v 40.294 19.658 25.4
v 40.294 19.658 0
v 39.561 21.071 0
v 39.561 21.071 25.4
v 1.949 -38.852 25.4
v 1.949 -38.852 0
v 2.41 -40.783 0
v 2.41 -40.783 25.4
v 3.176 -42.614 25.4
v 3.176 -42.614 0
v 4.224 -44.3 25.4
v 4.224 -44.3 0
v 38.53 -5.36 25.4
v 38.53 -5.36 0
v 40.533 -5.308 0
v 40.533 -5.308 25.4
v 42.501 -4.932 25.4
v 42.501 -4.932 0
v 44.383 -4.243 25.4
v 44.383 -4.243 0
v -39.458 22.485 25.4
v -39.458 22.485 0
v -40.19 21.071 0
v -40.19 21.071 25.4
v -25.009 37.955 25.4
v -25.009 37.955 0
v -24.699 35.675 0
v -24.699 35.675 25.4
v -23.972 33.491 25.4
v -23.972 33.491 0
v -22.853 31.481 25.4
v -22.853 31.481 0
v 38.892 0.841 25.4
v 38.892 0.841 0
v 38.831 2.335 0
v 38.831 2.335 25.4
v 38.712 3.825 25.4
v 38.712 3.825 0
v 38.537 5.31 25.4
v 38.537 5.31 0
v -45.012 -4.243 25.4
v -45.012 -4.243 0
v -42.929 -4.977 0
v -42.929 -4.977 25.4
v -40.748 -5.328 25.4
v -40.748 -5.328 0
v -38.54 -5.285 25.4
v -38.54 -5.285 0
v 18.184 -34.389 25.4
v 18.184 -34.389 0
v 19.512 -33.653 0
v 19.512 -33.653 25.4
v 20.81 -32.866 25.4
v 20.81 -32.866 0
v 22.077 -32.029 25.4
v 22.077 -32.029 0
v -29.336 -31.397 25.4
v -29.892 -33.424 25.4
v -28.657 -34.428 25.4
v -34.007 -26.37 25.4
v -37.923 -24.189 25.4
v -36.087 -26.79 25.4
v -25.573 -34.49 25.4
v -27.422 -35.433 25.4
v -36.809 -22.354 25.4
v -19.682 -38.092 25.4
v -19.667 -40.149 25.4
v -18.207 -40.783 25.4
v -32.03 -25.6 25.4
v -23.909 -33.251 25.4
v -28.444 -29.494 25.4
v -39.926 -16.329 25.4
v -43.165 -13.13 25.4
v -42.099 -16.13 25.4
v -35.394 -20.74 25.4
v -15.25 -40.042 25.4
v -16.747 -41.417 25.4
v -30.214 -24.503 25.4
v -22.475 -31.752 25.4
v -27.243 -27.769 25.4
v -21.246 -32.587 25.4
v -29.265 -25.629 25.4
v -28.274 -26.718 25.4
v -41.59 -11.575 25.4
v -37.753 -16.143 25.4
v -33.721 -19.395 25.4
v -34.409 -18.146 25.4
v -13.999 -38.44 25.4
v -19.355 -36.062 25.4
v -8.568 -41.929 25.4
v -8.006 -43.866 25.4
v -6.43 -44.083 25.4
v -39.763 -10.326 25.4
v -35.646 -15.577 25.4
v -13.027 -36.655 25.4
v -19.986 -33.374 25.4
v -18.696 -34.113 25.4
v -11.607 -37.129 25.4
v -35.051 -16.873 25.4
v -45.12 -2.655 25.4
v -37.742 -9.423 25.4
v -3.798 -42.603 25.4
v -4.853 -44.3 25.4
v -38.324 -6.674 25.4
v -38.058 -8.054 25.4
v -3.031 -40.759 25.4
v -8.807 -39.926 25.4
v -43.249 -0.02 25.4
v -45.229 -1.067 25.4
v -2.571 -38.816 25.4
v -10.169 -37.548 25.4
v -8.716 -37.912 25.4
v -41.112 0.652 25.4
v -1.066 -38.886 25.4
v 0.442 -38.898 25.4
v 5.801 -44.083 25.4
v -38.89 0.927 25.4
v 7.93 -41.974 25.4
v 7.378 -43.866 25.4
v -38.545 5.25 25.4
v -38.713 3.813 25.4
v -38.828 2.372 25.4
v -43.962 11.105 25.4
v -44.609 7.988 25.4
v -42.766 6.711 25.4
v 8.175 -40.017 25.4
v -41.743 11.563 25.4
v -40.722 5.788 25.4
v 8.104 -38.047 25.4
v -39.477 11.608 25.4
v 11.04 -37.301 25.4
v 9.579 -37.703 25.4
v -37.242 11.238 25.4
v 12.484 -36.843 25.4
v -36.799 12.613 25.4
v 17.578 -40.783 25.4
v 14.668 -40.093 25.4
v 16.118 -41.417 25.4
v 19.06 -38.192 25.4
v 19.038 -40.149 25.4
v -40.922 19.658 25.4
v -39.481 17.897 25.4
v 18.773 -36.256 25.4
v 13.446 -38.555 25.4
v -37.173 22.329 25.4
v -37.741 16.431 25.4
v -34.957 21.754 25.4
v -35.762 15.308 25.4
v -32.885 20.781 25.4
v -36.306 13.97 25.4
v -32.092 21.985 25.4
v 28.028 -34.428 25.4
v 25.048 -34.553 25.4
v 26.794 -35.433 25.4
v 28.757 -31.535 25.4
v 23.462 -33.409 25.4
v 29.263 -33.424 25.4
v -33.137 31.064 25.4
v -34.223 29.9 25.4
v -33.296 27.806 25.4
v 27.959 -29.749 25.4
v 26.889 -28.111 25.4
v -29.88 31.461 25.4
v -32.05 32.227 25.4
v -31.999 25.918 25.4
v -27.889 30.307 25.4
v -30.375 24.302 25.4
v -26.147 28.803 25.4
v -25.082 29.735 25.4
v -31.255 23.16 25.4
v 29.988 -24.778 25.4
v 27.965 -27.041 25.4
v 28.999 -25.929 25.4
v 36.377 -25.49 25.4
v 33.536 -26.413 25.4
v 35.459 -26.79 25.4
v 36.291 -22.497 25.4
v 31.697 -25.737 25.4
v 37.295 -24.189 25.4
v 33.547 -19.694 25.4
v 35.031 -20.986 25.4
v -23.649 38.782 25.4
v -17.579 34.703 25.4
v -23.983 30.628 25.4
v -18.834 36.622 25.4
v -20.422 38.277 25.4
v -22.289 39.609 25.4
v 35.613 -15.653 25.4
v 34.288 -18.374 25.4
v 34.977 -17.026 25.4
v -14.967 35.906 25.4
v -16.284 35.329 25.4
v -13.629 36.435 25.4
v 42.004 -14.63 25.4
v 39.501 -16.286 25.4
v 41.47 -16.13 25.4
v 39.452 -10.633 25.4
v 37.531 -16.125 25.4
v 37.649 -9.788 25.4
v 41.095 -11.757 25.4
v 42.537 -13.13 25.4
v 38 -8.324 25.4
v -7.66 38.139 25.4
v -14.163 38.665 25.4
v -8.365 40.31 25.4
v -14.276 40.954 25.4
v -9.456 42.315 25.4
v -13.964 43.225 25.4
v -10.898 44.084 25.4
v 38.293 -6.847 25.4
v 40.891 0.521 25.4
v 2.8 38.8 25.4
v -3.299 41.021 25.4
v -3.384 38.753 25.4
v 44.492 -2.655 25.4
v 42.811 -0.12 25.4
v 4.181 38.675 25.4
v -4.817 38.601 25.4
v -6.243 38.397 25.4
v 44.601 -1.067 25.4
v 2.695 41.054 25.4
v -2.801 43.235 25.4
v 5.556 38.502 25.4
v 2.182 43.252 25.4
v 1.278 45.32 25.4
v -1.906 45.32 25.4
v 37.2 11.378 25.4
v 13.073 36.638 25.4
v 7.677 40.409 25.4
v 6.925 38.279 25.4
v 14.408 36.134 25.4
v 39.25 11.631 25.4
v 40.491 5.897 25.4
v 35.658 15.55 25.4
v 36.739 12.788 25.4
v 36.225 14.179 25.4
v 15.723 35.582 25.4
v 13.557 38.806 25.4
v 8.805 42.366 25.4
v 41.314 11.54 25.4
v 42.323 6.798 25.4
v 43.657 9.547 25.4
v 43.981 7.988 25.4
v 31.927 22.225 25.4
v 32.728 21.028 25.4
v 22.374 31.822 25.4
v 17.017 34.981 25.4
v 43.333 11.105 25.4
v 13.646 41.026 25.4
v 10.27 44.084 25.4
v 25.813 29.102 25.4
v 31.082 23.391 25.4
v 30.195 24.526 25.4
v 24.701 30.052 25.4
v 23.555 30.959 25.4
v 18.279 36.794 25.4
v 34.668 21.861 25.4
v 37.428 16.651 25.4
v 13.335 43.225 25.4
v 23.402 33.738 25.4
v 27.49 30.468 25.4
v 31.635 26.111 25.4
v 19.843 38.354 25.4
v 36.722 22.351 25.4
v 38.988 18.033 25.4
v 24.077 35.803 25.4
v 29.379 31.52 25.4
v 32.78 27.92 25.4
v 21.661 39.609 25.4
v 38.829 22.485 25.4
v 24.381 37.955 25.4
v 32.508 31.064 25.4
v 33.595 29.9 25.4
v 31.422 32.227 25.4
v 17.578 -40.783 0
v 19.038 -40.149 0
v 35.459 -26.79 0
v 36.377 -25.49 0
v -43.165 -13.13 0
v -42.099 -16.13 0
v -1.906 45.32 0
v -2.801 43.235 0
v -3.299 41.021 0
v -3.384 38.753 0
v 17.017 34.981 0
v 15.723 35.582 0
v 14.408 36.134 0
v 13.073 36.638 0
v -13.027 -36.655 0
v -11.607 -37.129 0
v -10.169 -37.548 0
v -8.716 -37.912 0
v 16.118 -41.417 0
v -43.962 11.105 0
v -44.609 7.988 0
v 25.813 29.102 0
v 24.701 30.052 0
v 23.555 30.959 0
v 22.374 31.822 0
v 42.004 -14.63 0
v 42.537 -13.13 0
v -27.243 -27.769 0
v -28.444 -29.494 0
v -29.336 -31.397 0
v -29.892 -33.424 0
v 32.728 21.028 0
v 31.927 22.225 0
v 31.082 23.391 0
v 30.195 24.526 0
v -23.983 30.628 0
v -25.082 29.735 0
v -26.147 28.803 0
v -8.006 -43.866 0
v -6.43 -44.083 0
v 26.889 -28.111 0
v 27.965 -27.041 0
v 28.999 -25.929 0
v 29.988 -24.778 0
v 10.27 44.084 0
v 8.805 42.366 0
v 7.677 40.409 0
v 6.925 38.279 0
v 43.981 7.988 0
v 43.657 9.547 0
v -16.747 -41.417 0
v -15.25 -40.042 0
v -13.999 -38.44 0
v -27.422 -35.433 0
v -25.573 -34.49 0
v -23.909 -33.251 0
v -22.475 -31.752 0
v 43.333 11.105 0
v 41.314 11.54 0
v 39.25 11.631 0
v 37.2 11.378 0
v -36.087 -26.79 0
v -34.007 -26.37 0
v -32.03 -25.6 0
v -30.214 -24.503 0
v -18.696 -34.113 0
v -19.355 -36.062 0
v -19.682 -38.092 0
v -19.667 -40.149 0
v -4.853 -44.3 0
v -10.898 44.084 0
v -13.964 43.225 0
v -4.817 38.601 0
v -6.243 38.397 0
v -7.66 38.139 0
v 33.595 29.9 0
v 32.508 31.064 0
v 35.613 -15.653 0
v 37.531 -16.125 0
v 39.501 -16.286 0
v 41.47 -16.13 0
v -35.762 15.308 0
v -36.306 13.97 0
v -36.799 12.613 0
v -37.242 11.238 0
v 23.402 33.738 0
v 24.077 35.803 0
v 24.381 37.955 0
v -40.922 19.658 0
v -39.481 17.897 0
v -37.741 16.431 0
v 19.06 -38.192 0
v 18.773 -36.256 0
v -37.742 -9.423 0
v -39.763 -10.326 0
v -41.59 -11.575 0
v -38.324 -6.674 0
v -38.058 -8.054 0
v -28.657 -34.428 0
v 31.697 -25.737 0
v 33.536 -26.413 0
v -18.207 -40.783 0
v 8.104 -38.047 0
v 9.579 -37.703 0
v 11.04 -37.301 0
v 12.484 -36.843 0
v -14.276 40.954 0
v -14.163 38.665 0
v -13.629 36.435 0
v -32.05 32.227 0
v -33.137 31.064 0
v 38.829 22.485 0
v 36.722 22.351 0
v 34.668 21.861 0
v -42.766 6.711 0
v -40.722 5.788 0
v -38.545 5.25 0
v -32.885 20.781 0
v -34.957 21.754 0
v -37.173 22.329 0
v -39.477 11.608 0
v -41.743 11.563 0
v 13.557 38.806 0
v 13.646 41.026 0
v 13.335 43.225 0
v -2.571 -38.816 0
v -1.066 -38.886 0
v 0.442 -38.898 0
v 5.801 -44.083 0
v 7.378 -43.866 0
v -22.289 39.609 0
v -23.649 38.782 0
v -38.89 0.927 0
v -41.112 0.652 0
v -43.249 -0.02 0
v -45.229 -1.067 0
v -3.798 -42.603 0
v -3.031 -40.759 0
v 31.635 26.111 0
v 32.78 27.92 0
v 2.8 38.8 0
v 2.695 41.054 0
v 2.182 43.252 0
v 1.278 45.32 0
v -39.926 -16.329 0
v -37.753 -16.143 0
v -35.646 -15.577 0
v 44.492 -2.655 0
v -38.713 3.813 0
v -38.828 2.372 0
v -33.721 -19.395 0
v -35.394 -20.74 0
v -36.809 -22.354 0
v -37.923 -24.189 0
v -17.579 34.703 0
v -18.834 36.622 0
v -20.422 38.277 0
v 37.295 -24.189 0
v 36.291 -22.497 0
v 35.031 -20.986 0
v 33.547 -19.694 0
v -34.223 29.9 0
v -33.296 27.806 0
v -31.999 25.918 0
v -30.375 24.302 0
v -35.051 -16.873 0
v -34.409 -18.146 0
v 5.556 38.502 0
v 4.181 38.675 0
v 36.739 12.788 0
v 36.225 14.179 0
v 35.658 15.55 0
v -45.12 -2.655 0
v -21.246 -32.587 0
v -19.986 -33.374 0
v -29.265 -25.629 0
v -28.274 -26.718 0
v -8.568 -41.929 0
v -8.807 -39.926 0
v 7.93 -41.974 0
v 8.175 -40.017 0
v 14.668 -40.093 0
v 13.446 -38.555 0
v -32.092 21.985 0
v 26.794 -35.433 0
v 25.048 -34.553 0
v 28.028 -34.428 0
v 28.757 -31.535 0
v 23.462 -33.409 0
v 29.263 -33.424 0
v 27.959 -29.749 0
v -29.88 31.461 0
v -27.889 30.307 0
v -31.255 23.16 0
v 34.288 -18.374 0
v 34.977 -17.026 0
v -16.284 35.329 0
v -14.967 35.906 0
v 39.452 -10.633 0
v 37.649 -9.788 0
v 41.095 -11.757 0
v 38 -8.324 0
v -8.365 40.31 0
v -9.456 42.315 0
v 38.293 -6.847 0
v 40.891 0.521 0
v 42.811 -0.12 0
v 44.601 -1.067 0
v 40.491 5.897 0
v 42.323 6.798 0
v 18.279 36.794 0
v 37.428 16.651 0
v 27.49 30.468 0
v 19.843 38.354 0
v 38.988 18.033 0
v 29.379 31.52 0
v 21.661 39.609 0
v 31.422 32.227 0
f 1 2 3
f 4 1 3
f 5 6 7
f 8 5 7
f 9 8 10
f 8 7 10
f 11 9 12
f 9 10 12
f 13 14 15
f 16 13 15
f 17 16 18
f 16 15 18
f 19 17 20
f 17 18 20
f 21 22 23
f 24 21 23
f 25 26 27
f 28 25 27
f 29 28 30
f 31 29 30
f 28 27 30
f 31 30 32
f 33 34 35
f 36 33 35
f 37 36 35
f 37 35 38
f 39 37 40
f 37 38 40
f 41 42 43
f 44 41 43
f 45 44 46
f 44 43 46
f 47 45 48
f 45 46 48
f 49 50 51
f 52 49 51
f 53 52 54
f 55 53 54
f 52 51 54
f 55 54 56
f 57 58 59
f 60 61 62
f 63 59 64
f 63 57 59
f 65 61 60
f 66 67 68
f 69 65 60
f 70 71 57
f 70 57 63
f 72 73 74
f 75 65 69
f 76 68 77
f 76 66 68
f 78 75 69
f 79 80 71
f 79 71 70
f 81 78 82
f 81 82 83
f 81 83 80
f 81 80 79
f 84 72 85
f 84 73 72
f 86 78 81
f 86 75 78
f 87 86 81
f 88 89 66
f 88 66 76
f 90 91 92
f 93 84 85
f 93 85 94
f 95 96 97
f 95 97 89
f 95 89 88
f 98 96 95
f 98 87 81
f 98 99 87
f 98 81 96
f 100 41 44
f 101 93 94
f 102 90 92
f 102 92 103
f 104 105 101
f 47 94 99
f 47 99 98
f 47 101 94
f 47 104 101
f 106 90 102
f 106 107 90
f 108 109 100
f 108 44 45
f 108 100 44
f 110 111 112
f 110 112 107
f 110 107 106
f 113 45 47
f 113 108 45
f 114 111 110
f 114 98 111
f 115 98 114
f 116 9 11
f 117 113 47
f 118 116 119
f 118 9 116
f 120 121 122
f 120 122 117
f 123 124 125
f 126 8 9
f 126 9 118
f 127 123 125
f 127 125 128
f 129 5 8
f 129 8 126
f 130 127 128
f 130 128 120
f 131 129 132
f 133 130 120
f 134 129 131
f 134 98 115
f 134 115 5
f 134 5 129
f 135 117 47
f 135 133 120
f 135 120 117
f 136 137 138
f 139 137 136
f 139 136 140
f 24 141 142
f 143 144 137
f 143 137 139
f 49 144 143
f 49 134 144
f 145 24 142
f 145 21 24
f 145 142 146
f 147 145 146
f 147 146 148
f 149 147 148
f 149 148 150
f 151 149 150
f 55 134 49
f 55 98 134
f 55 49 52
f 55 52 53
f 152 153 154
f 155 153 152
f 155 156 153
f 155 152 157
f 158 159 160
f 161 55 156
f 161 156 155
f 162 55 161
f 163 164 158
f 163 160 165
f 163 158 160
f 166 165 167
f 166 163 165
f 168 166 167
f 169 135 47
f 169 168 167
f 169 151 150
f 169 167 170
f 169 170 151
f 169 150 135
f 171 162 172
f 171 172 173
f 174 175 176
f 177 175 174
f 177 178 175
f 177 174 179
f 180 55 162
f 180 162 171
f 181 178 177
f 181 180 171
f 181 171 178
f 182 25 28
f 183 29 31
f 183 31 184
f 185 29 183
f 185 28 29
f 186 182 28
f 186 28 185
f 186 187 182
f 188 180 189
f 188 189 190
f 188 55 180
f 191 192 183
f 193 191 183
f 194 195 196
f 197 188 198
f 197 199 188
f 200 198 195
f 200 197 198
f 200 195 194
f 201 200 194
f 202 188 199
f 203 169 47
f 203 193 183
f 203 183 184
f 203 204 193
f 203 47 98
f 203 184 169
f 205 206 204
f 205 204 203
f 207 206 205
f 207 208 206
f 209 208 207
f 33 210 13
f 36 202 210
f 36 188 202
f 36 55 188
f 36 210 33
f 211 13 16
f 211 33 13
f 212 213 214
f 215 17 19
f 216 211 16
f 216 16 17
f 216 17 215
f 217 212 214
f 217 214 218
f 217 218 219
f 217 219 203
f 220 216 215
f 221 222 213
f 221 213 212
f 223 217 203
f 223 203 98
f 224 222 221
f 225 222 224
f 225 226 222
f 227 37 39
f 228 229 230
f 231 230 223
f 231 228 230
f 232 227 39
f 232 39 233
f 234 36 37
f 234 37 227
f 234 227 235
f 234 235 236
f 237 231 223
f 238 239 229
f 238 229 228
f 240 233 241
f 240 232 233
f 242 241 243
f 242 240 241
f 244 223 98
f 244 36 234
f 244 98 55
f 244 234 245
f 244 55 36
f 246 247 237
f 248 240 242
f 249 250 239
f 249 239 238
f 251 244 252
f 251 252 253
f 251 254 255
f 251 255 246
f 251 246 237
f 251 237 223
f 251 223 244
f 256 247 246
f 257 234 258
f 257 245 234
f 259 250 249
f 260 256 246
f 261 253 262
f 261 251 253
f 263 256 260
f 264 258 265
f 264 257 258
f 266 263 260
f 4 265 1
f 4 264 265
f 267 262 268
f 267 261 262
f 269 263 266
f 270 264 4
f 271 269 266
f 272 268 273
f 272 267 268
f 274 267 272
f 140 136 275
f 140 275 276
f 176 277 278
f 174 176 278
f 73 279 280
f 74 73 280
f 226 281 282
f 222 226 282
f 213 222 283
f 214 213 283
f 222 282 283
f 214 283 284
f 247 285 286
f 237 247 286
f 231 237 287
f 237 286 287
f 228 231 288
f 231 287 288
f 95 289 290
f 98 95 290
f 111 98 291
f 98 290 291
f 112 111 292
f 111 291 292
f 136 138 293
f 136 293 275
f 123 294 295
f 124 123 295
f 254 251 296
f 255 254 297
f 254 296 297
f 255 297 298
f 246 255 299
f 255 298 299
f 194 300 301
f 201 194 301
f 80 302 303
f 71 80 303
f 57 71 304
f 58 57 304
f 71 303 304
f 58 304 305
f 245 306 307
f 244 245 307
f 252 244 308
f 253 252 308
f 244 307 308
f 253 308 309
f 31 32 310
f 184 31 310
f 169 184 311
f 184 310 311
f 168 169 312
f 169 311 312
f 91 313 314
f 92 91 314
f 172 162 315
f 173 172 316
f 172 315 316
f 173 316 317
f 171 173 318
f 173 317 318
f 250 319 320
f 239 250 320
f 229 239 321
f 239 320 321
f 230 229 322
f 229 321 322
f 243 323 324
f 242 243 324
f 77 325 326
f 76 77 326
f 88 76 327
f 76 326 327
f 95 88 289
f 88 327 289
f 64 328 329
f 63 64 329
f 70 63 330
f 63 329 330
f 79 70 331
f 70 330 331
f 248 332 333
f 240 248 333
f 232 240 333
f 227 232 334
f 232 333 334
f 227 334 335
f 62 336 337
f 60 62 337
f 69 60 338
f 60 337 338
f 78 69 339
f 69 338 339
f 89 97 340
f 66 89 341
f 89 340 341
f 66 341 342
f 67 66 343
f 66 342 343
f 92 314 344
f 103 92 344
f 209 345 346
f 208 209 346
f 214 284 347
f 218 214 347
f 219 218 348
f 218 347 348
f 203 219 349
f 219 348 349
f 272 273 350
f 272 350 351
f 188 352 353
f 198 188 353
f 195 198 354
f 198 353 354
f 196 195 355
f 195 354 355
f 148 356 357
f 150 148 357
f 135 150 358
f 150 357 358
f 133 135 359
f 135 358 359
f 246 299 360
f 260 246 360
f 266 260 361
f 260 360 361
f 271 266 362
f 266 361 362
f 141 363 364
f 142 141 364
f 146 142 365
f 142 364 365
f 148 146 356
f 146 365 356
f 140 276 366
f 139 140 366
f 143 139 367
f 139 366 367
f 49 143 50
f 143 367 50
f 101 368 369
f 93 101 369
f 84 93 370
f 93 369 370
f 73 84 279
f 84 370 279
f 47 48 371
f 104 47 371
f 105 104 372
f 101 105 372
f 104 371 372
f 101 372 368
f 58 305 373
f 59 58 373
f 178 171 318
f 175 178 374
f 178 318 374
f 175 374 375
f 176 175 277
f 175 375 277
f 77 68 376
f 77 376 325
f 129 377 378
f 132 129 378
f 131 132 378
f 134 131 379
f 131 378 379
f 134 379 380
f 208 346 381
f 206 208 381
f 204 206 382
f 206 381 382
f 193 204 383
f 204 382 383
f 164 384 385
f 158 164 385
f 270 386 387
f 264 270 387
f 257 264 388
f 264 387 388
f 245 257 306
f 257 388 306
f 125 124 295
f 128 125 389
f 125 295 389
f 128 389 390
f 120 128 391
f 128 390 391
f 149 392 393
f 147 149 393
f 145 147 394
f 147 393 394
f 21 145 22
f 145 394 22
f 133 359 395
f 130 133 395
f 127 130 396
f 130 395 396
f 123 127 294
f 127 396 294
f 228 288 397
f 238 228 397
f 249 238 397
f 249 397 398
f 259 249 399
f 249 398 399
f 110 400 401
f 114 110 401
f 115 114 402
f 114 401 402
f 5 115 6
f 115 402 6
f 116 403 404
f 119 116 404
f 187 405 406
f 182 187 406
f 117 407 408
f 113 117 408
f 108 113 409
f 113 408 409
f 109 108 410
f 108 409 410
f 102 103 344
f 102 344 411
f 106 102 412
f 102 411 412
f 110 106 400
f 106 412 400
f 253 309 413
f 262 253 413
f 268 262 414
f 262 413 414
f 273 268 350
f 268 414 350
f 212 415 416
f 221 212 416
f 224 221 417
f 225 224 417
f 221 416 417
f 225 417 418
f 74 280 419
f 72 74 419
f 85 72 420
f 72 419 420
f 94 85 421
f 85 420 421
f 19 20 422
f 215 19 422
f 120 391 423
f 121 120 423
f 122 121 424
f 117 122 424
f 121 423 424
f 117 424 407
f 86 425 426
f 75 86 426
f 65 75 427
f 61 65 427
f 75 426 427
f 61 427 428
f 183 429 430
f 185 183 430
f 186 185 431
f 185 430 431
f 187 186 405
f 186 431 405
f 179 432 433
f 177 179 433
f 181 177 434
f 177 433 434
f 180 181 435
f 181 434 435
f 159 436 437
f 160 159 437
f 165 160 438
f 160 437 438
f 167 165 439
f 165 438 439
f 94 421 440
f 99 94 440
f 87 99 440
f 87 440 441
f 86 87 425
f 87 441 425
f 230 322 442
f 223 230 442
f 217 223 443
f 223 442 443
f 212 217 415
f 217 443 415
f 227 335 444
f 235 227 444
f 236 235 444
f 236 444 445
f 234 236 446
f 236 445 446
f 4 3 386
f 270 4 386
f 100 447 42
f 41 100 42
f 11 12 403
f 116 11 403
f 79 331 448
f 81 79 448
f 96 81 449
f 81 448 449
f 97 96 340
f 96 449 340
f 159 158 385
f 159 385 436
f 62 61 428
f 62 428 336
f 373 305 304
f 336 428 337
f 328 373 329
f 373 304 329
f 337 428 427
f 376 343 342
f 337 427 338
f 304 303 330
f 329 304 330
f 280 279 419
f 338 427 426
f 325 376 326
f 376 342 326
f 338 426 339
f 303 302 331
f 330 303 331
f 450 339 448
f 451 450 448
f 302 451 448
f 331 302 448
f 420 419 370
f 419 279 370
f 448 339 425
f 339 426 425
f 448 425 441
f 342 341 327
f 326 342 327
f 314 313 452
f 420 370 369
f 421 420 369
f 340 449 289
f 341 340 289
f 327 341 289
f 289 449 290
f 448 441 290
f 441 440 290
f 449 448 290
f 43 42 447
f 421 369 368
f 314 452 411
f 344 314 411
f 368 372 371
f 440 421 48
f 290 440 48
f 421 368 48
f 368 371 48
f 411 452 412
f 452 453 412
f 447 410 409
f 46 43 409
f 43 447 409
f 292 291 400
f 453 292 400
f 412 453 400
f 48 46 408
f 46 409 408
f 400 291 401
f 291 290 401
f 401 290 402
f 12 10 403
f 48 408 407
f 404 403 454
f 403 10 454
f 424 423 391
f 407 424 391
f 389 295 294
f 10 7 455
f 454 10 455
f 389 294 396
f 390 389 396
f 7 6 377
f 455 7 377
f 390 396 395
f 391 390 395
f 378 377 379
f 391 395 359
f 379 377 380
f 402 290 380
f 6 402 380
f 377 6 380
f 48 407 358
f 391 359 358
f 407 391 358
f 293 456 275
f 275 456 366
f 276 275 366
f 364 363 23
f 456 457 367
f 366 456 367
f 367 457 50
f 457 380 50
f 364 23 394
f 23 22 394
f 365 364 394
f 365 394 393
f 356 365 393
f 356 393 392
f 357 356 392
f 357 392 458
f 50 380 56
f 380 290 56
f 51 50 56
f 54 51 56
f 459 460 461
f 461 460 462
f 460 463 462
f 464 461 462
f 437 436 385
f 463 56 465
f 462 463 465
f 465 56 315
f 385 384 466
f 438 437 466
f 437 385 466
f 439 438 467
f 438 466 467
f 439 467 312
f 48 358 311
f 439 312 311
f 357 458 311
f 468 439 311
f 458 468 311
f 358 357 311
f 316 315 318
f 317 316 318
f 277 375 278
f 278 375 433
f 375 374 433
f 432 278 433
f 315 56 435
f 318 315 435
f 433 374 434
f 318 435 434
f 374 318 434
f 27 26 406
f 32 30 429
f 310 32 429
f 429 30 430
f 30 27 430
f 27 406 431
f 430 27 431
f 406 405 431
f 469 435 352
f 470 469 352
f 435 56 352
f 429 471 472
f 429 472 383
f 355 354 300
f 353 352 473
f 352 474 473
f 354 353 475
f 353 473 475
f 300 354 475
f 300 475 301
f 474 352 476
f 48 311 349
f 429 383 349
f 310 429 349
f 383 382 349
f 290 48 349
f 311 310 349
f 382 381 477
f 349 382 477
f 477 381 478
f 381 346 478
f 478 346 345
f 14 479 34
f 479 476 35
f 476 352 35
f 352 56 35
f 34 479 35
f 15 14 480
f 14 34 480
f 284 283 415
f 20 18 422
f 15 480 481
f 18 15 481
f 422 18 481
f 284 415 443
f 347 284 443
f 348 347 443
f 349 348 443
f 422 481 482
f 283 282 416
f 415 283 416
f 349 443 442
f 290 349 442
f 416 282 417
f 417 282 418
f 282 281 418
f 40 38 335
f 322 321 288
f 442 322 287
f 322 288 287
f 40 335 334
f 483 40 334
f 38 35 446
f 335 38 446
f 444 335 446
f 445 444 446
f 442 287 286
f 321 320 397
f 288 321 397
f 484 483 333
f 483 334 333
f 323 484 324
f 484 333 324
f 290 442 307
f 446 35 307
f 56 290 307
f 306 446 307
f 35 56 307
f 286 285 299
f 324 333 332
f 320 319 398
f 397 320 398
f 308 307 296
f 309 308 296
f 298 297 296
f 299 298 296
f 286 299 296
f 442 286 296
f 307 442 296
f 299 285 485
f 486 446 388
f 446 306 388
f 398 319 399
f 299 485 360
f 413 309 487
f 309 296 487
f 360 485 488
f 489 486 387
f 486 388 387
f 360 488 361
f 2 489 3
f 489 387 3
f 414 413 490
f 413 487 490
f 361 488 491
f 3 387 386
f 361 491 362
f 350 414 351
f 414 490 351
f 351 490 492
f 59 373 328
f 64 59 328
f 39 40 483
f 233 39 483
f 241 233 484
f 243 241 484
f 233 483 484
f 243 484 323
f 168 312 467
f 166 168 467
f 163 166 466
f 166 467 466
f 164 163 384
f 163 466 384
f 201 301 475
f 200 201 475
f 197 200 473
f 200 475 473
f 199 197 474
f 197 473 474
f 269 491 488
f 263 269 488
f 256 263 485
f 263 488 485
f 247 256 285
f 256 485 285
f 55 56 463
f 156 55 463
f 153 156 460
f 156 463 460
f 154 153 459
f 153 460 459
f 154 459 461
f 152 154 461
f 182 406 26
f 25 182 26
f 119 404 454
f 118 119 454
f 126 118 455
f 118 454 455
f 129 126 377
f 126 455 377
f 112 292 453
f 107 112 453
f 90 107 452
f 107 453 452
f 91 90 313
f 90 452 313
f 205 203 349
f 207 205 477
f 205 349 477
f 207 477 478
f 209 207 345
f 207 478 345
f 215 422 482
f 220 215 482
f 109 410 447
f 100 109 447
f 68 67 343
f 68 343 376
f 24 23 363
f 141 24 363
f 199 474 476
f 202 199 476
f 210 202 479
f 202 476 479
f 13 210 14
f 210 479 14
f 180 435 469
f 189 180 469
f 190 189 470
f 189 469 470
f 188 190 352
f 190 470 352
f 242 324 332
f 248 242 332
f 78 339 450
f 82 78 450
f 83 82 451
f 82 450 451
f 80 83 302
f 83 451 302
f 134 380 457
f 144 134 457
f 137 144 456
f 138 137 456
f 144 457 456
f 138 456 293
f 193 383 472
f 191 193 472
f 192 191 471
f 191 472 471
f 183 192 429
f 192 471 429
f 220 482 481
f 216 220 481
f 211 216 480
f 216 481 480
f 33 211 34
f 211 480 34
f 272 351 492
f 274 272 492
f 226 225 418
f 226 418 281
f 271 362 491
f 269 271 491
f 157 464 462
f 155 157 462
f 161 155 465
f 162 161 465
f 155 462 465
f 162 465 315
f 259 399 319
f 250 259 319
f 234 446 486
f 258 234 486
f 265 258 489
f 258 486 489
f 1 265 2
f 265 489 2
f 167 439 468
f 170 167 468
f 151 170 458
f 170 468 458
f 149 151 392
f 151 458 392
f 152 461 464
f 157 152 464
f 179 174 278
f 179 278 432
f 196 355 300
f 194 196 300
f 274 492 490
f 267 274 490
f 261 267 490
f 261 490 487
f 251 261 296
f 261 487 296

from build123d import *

# Parameters (mm, degrees)
F1_DEPTH = 25.4


with BuildPart() as f1:
    # F0 (on Top) → F1 (new body)
    with BuildSketch(Plane.XY):
        with BuildLine():
            ThreePointArc((32.727631, 21.027882), (31.509958, 22.812106), (30.195125, 24.525989))
            ThreePointArc((30.195125, 24.525989), (28.097608, 26.903421), (25.813456, 29.10215))
            ThreePointArc((25.813456, 29.10215), (24.132258, 30.510716), (22.374347, 31.822292))
            ThreePointArc((22.374347, 31.822292), (19.758786, 33.509104), (17.016748, 34.981423))
            ThreePointArc((17.016748, 34.981423), (15.067644, 35.864129), (13.072955, 36.638334))
            ThreePointArc((13.072955, 36.638334), (10.032541, 37.584808), (6.924902, 38.279438))
            ThreePointArc((6.924902, 38.279438), (4.869469, 38.594791), (2.800122, 38.799858))
            ThreePointArc((2.800122, 38.799858), (-0.292989, 38.899663), (-3.384245, 38.753278))
            ThreePointArc((-3.384245, 38.753278), (-5.530805, 38.505582), (-7.6603, 38.13908))
            ThreePointArc((-7.6603, 38.13908), (-10.678739, 37.406339), (-13.629096, 36.435112))
            ThreePointArc((-13.629096, 36.435112), (-15.62784, 35.623592), (-17.578527, 34.702522))
            ThreePointArc((-17.578527, 34.702522), (-20.279662, 33.19646), (-22.852623, 31.480586))
            ThreePointArc((-22.852623, 31.480586), (-24.53635, 30.186705), (-26.146967, 28.802878))
            ThreePointArc((-26.146967, 28.802878), (-28.350641, 26.636644), (-30.375422, 24.302334))
            ThreePointArc((-30.375422, 24.302334), (-31.679308, 22.57634), (-32.885238, 20.780539))
            ThreePointArc((-32.885238, 20.780539), (-34.432628, 18.101486), (-35.762224, 15.307939))
            ThreePointArc((-35.762224, 15.307939), (-36.558777, 13.293813), (-37.241997, 11.238475))
            ThreePointArc((-37.241997, 11.238475), (-38.011585, 8.26977), (-38.544918, 5.249665))
            ThreePointArc((-38.544918, 5.249665), (-38.777585, 3.093314), (-38.889712, 0.927347))
            ThreePointArc((-38.889712, 0.927347), (-38.839298, -2.185995), (-38.540043, -5.285331))
            ThreePointArc((-38.540043, -5.285331), (-38.197191, -7.365072), (-37.742194, -9.423189))
            ThreePointArc((-37.742194, -9.423189), (-36.822835, -12.543862), (-35.645937, -15.576804))
            ThreePointArc((-35.645937, -15.576804), (-34.736064, -17.512153), (-33.721211, -19.394576))
            ThreePointArc((-33.721211, -19.394576), (-32.069492, -22.018568), (-30.214042, -24.50268))
            ThreePointArc((-30.214042, -24.50268), (-28.774727, -26.177944), (-27.242655, -27.768821))
            ThreePointArc((-27.242655, -27.768821), (-24.938289, -29.855509), (-22.474656, -31.751528))
            ThreePointArc((-22.474656, -31.751528), (-20.619346, -32.986546), (-18.696351, -34.113284))
            ThreePointArc((-18.696351, -34.113284), (-15.912451, -35.497374), (-13.026912, -36.65473))
            ThreePointArc((-13.026912, -36.65473), (-10.889755, -37.345453), (-8.716297, -37.911685))
            ThreePointArc((-8.716297, -37.911685), (-5.661882, -38.486527), (-2.571325, -38.815692))
            ThreePointArc((-2.571325, -38.815692), (-0.311922, -38.899516), (1.948535, -38.851935))
            ThreePointArc((1.948535, -38.851935), (5.042543, -38.57256), (8.104392, -38.047188))
            ThreePointArc((8.104392, -38.047188), (10.311642, -37.509195), (12.483722, -36.843267))
            ThreePointArc((12.483722, -36.843267), (15.382759, -35.730105), (18.183768, -34.389246))
            ThreePointArc((18.183768, -34.389246), (20.164988, -33.266243), (22.077098, -32.029227))
            ThreePointArc((22.077098, -32.029227), (24.561273, -30.166431), (26.888966, -28.111442))
            ThreePointArc((26.888966, -28.111442), (28.487463, -26.490265), (29.988381, -24.778351))
            ThreePointArc((29.988381, -24.778351), (31.869393, -22.307206), (33.547287, -19.693887))
            ThreePointArc((33.547287, -19.693887), (34.638892, -17.703583), (35.612545, -15.652996))
            ThreePointArc((35.612545, -15.652996), (36.748128, -12.761063), (37.649303, -9.787731))
            ThreePointArc((37.649303, -9.787731), (38.153791, -7.586691), (38.529718, -5.360087))
            ThreePointArc((38.529718, -5.360087), (38.807894, -2.686457), (38.900767, 0))
            ThreePointArc((38.900767, 0), (38.898494, 0.420524), (38.891675, 0.840998))
            ThreePointArc((38.891675, 0.840998), (38.77859, 3.080681), (38.536635, 5.310126))
            ThreePointArc((38.536635, 5.310126), (37.989495, 8.37066), (37.199691, 11.377726))
            ThreePointArc((37.199691, 11.377726), (36.488316, 13.486011), (35.657562, 15.550174))
            ThreePointArc((35.657562, 15.550174), (34.302113, 18.347607), (32.727631, 21.027882))
        make_face()
        with BuildLine():
            ThreePointArc((25.813456, 29.10215), (28.097608, 26.903421), (30.195125, 24.525989))
            ThreePointArc((30.195125, 24.525989), (32.246607, 26.990627), (33.594685, 29.900215))
            Line((33.594685, 29.900215), (32.508244, 31.063509))
            Line((32.508244, 31.063509), (31.421803, 32.226804))
            ThreePointArc((31.421803, 32.226804), (28.411119, 31.035137), (25.813456, 29.10215))
        make_face()
        with BuildLine():
            ThreePointArc((38.829153, 22.484663), (35.684393, 22.149975), (32.727631, 21.027882))
            ThreePointArc((32.727631, 21.027882), (34.302113, 18.347607), (35.657562, 15.550174))
            ThreePointArc((35.657562, 15.550174), (38.237287, 17.308872), (40.293752, 19.658115))
            Line((40.293752, 19.658115), (39.561453, 21.071389))
            Line((39.561453, 21.071389), (38.829153, 22.484663))
        make_face()
        with BuildLine():
            ThreePointArc((17.016748, 34.981423), (19.758786, 33.509104), (22.374347, 31.822292))
            ThreePointArc((22.374347, 31.822292), (23.785008, 34.755405), (24.380752, 37.955124))
            Line((24.380752, 37.955124), (23.020746, 38.782162))
            Line((23.020746, 38.782162), (21.66074, 39.6092))
            ThreePointArc((21.66074, 39.6092), (19.026169, 37.608982), (17.016748, 34.981423))
        make_face()
        with BuildLine():
            ThreePointArc((43.33342, 11.105309), (40.283748, 11.628616), (37.199691, 11.377726))
            ThreePointArc((37.199691, 11.377726), (37.989495, 8.37066), (38.536635, 5.310126))
            ThreePointArc((38.536635, 5.310126), (41.425852, 6.309847), (43.981115, 7.988433))
            Line((43.981115, 7.988433), (43.657268, 9.546871))
            Line((43.657268, 9.546871), (43.33342, 11.105309))
        make_face()
        with BuildLine():
            ThreePointArc((6.924902, 38.279438), (10.032541, 37.584808), (13.072955, 36.638334))
            ThreePointArc((13.072955, 36.638334), (13.651595, 39.914068), (13.335307, 43.225445))
            Line((13.335307, 43.225445), (11.802602, 43.654889))
            Line((11.802602, 43.654889), (10.269897, 44.084333))
            ThreePointArc((10.269897, 44.084333), (8.196403, 41.412955), (6.924902, 38.279438))
        make_face()
        with BuildLine():
            ThreePointArc((44.600544, -1.067304), (41.864106, 0.239845), (38.891675, 0.840998))
            ThreePointArc((38.891675, 0.840998), (38.898494, 0.420524), (38.900767, 0))
            ThreePointArc((38.900767, 0), (38.807894, -2.686457), (38.529718, -5.360087))
            ThreePointArc((38.529718, -5.360087), (41.524847, -5.15993), (44.383297, -4.243345))
            Line((44.383297, -4.243345), (44.491921, -2.655324))
            Line((44.491921, -2.655324), (44.600544, -1.067304))
        make_face()
        with BuildLine():
            ThreePointArc((-3.384245, 38.753278), (-0.292989, 38.899663), (2.800122, 38.799858))
            ThreePointArc((2.800122, 38.799858), (2.48899, 42.165197), (1.277542, 45.320304))
            Line((1.277542, 45.320304), (-0.314188, 45.320304))
            Line((-0.314188, 45.320304), (-1.905919, 45.320304))
            ThreePointArc((-1.905919, 45.320304), (-3.100955, 42.139414), (-3.384245, 38.753278))
        make_face()
        with BuildLine():
            ThreePointArc((-13.629096, 36.435112), (-10.678739, 37.406339), (-7.6603, 38.13908))
            ThreePointArc((-7.6603, 38.13908), (-8.864125, 41.337817), (-10.898274, 44.084333))
            Line((-10.898274, 44.084333), (-12.430979, 43.654889))
            Line((-12.430979, 43.654889), (-13.963684, 43.225445))
            ThreePointArc((-13.963684, 43.225445), (-14.272658, 39.806811), (-13.629096, 36.435112))
        make_face()
        with BuildLine():
            ThreePointArc((42.536548, -13.13039), (40.296134, -11.161952), (37.649303, -9.787731))
            ThreePointArc((37.649303, -9.787731), (36.748128, -12.761063), (35.612545, -15.652996))
            ThreePointArc((35.612545, -15.652996), (38.512728, -16.24493), (41.470471, -16.130042))
            Line((41.470471, -16.130042), (42.003509, -14.630216))
            Line((42.003509, -14.630216), (42.536548, -13.13039))
        make_face()
        with BuildLine():
            ThreePointArc((-22.852623, 31.480586), (-20.279662, 33.19646), (-17.578527, 34.702522))
            ThreePointArc((-17.578527, 34.702522), (-19.589499, 37.486424), (-22.289117, 39.6092))
            Line((-22.289117, 39.6092), (-23.649122, 38.782162))
            Line((-23.649122, 38.782162), (-25.009128, 37.955124))
            ThreePointArc((-25.009128, 37.955124), (-24.386778, 34.566005), (-22.852623, 31.480586))
        make_face()
        with BuildLine():
            ThreePointArc((37.294508, -24.189285), (35.690922, -21.716502), (33.547287, -19.693887))
            ThreePointArc((33.547287, -19.693887), (31.869393, -22.307206), (29.988381, -24.778351))
            ThreePointArc((29.988381, -24.778351), (32.603195, -26.111416), (35.458669, -26.790077))
            Line((35.458669, -26.790077), (36.376588, -25.489681))
            Line((36.376588, -25.489681), (37.294508, -24.189285))
        make_face()
        with BuildLine():
            ThreePointArc((-30.375422, 24.302334), (-28.350641, 26.636644), (-26.146967, 28.802878))
            ThreePointArc((-26.146967, 28.802878), (-28.857476, 30.930518), (-32.05018, 32.226804))
            Line((-32.05018, 32.226804), (-33.136621, 31.063509))
            Line((-33.136621, 31.063509), (-34.223062, 29.900215))
            ThreePointArc((-34.223062, 29.900215), (-32.691519, 26.831647), (-30.375422, 24.302334))
        make_face()
        with BuildLine():
            ThreePointArc((29.263204, -33.4238), (28.393297, -30.62585), (26.888966, -28.111442))
            ThreePointArc((26.888966, -28.111442), (24.561273, -30.166431), (22.077098, -32.029227))
            ThreePointArc((22.077098, -32.029227), (24.232273, -34.012563), (26.793757, -35.432844))
            Line((26.793757, -35.432844), (28.02848, -34.428322))
            Line((28.02848, -34.428322), (29.263204, -33.4238))
        make_face()
        with BuildLine():
            ThreePointArc((-35.762224, 15.307939), (-34.432628, 18.101486), (-32.885238, 20.780539))
            ThreePointArc((-32.885238, 20.780539), (-36.052021, 22.092946), (-39.45753, 22.484663))
            Line((-39.45753, 22.484663), (-40.189829, 21.071389))
            Line((-40.189829, 21.071389), (-40.922129, 19.658115))
            ThreePointArc((-40.922129, 19.658115), (-38.64498, 17.12386), (-35.762224, 15.307939))
        make_face()
        with BuildLine():
            ThreePointArc((19.038279, -40.149054), (18.955201, -37.218089), (18.183768, -34.389246))
            ThreePointArc((18.183768, -34.389246), (15.382759, -35.730105), (12.483722, -36.843267))
            ThreePointArc((12.483722, -36.843267), (14.026781, -39.348245), (16.118372, -41.417349))
            Line((16.118372, -41.417349), (17.578326, -40.783202))
            Line((17.578326, -40.783202), (19.038279, -40.149054))
        make_face()
        with BuildLine():
            ThreePointArc((-38.544918, 5.249665), (-38.011585, 8.26977), (-37.241997, 11.238475))
            ThreePointArc((-37.241997, 11.238475), (-40.611127, 11.637632), (-43.961797, 11.105309))
            Line((-43.961797, 11.105309), (-44.285644, 9.546871))
            Line((-44.285644, 9.546871), (-44.609491, 7.988433))
            ThreePointArc((-44.609491, 7.988433), (-41.765065, 6.20306), (-38.544918, 5.249665))
        make_face()
        with BuildLine():
            ThreePointArc((7.378071, -43.866267), (8.091495, -41.000446), (8.104392, -38.047188))
            ThreePointArc((8.104392, -38.047188), (5.042543, -38.57256), (1.948535, -38.851935))
            ThreePointArc((1.948535, -38.851935), (2.75619, -41.71378), (4.22426, -44.299748))
            Line((4.22426, -44.299748), (5.801166, -44.083007))
            Line((5.801166, -44.083007), (7.378071, -43.866267))
        make_face()
        with BuildLine():
            ThreePointArc((-38.540043, -5.285331), (-38.839298, -2.185995), (-38.889712, 0.927347))
            ThreePointArc((-38.889712, 0.927347), (-42.19595, 0.364258), (-45.228921, -1.067304))
            Line((-45.228921, -1.067304), (-45.120297, -2.655324))
            Line((-45.120297, -2.655324), (-45.011674, -4.243345))
            ThreePointArc((-45.011674, -4.243345), (-41.846225, -5.201372), (-38.540043, -5.285331))
        make_face()
        with BuildLine():
            ThreePointArc((-4.852637, -44.299748), (-3.377512, -41.696856), (-2.571325, -38.815692))
            ThreePointArc((-2.571325, -38.815692), (-5.661882, -38.486527), (-8.716297, -37.911685))
            ThreePointArc((-8.716297, -37.911685), (-8.728137, -40.932698), (-8.006448, -43.866267))
            Line((-8.006448, -43.866267), (-6.429542, -44.083007))
            Line((-6.429542, -44.083007), (-4.852637, -44.299748))
        make_face()
        with BuildLine():
            ThreePointArc((-35.645937, -15.576804), (-36.822835, -12.543862), (-37.742194, -9.423189))
            ThreePointArc((-37.742194, -9.423189), (-40.704458, -10.909786), (-43.164924, -13.13039))
            Line((-43.164924, -13.13039), (-42.631886, -14.630216))
            Line((-42.631886, -14.630216), (-42.098848, -16.130042))
            ThreePointArc((-42.098848, -16.130042), (-38.835495, -16.283792), (-35.645937, -15.576804))
        make_face()
        with BuildLine():
            ThreePointArc((-16.746749, -41.417349), (-14.591142, -39.266987), (-13.026912, -36.65473))
            ThreePointArc((-13.026912, -36.65473), (-15.912451, -35.497374), (-18.696351, -34.113284))
            ThreePointArc((-18.696351, -34.113284), (-19.560722, -37.070206), (-19.666656, -40.149054))
            Line((-19.666656, -40.149054), (-18.206703, -40.783202))
            Line((-18.206703, -40.783202), (-16.746749, -41.417349))
        make_face()
        with BuildLine():
            ThreePointArc((-30.214042, -24.50268), (-32.069492, -22.018568), (-33.721211, -19.394576))
            ThreePointArc((-33.721211, -19.394576), (-36.136643, -21.516246), (-37.922885, -24.189285))
            Line((-37.922885, -24.189285), (-37.004965, -25.489681))
            Line((-37.004965, -25.489681), (-36.087045, -26.790077))
            ThreePointArc((-36.087045, -26.790077), (-33.002226, -26.027192), (-30.214042, -24.50268))
        make_face()
        with BuildLine():
            ThreePointArc((-27.422133, -35.432844), (-24.715011, -33.90584), (-22.474656, -31.751528))
            ThreePointArc((-22.474656, -31.751528), (-24.938289, -29.855509), (-27.242655, -27.768821))
            ThreePointArc((-27.242655, -27.768821), (-28.930301, -30.426187), (-29.89158, -33.4238))
            Line((-29.89158, -33.4238), (-28.656857, -34.428322))
            Line((-28.656857, -34.428322), (-27.422133, -35.432844))
        make_face()
    extrude(amount=F1_DEPTH)


solid = f1.part
